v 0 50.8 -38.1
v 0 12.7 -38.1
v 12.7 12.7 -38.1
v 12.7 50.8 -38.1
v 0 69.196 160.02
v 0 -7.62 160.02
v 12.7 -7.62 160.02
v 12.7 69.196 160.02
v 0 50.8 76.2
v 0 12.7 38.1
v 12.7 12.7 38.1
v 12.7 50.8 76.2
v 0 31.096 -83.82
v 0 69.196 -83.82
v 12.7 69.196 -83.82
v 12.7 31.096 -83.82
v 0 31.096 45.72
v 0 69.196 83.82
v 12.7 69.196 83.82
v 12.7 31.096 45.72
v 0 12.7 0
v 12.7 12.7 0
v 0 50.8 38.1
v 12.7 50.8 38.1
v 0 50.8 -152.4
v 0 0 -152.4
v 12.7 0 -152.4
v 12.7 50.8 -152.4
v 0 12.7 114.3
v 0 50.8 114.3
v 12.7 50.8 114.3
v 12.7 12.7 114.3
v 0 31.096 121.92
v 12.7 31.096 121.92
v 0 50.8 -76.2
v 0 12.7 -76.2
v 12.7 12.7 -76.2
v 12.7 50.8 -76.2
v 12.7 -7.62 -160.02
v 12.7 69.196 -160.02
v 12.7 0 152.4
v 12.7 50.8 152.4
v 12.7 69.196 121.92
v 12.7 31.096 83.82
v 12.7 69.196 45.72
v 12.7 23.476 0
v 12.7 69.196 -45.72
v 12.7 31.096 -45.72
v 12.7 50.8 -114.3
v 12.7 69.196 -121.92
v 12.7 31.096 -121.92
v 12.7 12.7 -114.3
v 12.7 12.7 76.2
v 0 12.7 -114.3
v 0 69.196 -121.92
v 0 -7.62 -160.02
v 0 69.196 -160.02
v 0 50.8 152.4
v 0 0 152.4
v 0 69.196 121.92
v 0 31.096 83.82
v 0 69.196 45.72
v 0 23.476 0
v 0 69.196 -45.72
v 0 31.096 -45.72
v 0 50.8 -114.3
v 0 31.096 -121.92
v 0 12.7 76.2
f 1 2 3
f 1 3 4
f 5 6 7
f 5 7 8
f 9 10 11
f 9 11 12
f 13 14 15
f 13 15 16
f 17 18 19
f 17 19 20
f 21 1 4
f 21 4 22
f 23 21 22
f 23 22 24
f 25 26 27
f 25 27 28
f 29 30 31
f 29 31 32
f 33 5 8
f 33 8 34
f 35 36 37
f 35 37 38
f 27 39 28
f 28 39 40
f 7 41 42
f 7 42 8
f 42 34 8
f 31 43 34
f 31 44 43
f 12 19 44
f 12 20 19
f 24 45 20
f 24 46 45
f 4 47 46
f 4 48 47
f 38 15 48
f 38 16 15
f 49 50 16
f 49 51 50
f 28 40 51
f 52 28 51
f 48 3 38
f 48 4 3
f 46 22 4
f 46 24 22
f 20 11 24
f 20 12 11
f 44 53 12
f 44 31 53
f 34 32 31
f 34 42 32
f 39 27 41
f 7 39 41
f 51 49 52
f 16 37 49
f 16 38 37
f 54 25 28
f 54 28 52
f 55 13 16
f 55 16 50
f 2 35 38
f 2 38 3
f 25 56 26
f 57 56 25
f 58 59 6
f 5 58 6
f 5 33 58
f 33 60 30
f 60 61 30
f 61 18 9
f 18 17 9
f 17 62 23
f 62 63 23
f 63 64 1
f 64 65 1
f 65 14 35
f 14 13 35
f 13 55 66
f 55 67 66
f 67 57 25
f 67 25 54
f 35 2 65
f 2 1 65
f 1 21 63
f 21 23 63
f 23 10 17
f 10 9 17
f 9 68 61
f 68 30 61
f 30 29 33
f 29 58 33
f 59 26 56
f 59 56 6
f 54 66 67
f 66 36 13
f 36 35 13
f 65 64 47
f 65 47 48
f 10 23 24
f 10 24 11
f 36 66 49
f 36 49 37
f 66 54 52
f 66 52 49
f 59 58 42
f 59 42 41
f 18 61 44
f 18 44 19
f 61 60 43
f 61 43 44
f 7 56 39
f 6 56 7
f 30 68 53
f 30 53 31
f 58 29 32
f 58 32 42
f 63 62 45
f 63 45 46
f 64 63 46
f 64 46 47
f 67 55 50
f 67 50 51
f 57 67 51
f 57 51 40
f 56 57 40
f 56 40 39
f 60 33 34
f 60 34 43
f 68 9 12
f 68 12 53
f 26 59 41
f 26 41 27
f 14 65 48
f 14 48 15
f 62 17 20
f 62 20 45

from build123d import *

# Parameters (mm, degrees)
BOSS_EXTRUDE1_DEPTH = 12.7


with BuildPart() as part:
    # Sketch1 → Boss-Extrude1 (new body)
    with BuildSketch(Plane(origin=(0, 0, 0), x_dir=(0, 0, -1), z_dir=(1, 0, 0))):
        Polygon((-160.02, -7.62), (-160.02, 69.196307345), (-121.92, 31.096307345), (-121.92, 69.196307345), (-83.82, 31.096307345), (-83.82, 69.196307345), (-45.72, 31.096307345), (-45.72, 69.196307345), (0, 23.476307345), (45.72, 69.196307345), (45.72, 31.096307345), (83.82, 69.196307345), (83.82, 31.096307345), (121.92, 69.196307345), (121.92, 31.096307345), (160.02, 69.196307345), (160.02, -7.62), align=None)
        Polygon((38.1, 12.7), (38.1, 50.8), (0, 12.7), (-38.1, 50.8), (-38.1, 12.7), (-76.2, 50.8), (-76.2, 12.7), (-114.3, 50.8), (-114.3, 12.7), (-152.4, 50.8), (-152.4, 0), (152.4, 0), (152.4, 50.8), (114.3, 12.7), (114.3, 50.8), (76.2, 12.7), (76.2, 50.8), align=None, mode=Mode.SUBTRACT)
    extrude(amount=BOSS_EXTRUDE1_DEPTH)


solid = part.part
